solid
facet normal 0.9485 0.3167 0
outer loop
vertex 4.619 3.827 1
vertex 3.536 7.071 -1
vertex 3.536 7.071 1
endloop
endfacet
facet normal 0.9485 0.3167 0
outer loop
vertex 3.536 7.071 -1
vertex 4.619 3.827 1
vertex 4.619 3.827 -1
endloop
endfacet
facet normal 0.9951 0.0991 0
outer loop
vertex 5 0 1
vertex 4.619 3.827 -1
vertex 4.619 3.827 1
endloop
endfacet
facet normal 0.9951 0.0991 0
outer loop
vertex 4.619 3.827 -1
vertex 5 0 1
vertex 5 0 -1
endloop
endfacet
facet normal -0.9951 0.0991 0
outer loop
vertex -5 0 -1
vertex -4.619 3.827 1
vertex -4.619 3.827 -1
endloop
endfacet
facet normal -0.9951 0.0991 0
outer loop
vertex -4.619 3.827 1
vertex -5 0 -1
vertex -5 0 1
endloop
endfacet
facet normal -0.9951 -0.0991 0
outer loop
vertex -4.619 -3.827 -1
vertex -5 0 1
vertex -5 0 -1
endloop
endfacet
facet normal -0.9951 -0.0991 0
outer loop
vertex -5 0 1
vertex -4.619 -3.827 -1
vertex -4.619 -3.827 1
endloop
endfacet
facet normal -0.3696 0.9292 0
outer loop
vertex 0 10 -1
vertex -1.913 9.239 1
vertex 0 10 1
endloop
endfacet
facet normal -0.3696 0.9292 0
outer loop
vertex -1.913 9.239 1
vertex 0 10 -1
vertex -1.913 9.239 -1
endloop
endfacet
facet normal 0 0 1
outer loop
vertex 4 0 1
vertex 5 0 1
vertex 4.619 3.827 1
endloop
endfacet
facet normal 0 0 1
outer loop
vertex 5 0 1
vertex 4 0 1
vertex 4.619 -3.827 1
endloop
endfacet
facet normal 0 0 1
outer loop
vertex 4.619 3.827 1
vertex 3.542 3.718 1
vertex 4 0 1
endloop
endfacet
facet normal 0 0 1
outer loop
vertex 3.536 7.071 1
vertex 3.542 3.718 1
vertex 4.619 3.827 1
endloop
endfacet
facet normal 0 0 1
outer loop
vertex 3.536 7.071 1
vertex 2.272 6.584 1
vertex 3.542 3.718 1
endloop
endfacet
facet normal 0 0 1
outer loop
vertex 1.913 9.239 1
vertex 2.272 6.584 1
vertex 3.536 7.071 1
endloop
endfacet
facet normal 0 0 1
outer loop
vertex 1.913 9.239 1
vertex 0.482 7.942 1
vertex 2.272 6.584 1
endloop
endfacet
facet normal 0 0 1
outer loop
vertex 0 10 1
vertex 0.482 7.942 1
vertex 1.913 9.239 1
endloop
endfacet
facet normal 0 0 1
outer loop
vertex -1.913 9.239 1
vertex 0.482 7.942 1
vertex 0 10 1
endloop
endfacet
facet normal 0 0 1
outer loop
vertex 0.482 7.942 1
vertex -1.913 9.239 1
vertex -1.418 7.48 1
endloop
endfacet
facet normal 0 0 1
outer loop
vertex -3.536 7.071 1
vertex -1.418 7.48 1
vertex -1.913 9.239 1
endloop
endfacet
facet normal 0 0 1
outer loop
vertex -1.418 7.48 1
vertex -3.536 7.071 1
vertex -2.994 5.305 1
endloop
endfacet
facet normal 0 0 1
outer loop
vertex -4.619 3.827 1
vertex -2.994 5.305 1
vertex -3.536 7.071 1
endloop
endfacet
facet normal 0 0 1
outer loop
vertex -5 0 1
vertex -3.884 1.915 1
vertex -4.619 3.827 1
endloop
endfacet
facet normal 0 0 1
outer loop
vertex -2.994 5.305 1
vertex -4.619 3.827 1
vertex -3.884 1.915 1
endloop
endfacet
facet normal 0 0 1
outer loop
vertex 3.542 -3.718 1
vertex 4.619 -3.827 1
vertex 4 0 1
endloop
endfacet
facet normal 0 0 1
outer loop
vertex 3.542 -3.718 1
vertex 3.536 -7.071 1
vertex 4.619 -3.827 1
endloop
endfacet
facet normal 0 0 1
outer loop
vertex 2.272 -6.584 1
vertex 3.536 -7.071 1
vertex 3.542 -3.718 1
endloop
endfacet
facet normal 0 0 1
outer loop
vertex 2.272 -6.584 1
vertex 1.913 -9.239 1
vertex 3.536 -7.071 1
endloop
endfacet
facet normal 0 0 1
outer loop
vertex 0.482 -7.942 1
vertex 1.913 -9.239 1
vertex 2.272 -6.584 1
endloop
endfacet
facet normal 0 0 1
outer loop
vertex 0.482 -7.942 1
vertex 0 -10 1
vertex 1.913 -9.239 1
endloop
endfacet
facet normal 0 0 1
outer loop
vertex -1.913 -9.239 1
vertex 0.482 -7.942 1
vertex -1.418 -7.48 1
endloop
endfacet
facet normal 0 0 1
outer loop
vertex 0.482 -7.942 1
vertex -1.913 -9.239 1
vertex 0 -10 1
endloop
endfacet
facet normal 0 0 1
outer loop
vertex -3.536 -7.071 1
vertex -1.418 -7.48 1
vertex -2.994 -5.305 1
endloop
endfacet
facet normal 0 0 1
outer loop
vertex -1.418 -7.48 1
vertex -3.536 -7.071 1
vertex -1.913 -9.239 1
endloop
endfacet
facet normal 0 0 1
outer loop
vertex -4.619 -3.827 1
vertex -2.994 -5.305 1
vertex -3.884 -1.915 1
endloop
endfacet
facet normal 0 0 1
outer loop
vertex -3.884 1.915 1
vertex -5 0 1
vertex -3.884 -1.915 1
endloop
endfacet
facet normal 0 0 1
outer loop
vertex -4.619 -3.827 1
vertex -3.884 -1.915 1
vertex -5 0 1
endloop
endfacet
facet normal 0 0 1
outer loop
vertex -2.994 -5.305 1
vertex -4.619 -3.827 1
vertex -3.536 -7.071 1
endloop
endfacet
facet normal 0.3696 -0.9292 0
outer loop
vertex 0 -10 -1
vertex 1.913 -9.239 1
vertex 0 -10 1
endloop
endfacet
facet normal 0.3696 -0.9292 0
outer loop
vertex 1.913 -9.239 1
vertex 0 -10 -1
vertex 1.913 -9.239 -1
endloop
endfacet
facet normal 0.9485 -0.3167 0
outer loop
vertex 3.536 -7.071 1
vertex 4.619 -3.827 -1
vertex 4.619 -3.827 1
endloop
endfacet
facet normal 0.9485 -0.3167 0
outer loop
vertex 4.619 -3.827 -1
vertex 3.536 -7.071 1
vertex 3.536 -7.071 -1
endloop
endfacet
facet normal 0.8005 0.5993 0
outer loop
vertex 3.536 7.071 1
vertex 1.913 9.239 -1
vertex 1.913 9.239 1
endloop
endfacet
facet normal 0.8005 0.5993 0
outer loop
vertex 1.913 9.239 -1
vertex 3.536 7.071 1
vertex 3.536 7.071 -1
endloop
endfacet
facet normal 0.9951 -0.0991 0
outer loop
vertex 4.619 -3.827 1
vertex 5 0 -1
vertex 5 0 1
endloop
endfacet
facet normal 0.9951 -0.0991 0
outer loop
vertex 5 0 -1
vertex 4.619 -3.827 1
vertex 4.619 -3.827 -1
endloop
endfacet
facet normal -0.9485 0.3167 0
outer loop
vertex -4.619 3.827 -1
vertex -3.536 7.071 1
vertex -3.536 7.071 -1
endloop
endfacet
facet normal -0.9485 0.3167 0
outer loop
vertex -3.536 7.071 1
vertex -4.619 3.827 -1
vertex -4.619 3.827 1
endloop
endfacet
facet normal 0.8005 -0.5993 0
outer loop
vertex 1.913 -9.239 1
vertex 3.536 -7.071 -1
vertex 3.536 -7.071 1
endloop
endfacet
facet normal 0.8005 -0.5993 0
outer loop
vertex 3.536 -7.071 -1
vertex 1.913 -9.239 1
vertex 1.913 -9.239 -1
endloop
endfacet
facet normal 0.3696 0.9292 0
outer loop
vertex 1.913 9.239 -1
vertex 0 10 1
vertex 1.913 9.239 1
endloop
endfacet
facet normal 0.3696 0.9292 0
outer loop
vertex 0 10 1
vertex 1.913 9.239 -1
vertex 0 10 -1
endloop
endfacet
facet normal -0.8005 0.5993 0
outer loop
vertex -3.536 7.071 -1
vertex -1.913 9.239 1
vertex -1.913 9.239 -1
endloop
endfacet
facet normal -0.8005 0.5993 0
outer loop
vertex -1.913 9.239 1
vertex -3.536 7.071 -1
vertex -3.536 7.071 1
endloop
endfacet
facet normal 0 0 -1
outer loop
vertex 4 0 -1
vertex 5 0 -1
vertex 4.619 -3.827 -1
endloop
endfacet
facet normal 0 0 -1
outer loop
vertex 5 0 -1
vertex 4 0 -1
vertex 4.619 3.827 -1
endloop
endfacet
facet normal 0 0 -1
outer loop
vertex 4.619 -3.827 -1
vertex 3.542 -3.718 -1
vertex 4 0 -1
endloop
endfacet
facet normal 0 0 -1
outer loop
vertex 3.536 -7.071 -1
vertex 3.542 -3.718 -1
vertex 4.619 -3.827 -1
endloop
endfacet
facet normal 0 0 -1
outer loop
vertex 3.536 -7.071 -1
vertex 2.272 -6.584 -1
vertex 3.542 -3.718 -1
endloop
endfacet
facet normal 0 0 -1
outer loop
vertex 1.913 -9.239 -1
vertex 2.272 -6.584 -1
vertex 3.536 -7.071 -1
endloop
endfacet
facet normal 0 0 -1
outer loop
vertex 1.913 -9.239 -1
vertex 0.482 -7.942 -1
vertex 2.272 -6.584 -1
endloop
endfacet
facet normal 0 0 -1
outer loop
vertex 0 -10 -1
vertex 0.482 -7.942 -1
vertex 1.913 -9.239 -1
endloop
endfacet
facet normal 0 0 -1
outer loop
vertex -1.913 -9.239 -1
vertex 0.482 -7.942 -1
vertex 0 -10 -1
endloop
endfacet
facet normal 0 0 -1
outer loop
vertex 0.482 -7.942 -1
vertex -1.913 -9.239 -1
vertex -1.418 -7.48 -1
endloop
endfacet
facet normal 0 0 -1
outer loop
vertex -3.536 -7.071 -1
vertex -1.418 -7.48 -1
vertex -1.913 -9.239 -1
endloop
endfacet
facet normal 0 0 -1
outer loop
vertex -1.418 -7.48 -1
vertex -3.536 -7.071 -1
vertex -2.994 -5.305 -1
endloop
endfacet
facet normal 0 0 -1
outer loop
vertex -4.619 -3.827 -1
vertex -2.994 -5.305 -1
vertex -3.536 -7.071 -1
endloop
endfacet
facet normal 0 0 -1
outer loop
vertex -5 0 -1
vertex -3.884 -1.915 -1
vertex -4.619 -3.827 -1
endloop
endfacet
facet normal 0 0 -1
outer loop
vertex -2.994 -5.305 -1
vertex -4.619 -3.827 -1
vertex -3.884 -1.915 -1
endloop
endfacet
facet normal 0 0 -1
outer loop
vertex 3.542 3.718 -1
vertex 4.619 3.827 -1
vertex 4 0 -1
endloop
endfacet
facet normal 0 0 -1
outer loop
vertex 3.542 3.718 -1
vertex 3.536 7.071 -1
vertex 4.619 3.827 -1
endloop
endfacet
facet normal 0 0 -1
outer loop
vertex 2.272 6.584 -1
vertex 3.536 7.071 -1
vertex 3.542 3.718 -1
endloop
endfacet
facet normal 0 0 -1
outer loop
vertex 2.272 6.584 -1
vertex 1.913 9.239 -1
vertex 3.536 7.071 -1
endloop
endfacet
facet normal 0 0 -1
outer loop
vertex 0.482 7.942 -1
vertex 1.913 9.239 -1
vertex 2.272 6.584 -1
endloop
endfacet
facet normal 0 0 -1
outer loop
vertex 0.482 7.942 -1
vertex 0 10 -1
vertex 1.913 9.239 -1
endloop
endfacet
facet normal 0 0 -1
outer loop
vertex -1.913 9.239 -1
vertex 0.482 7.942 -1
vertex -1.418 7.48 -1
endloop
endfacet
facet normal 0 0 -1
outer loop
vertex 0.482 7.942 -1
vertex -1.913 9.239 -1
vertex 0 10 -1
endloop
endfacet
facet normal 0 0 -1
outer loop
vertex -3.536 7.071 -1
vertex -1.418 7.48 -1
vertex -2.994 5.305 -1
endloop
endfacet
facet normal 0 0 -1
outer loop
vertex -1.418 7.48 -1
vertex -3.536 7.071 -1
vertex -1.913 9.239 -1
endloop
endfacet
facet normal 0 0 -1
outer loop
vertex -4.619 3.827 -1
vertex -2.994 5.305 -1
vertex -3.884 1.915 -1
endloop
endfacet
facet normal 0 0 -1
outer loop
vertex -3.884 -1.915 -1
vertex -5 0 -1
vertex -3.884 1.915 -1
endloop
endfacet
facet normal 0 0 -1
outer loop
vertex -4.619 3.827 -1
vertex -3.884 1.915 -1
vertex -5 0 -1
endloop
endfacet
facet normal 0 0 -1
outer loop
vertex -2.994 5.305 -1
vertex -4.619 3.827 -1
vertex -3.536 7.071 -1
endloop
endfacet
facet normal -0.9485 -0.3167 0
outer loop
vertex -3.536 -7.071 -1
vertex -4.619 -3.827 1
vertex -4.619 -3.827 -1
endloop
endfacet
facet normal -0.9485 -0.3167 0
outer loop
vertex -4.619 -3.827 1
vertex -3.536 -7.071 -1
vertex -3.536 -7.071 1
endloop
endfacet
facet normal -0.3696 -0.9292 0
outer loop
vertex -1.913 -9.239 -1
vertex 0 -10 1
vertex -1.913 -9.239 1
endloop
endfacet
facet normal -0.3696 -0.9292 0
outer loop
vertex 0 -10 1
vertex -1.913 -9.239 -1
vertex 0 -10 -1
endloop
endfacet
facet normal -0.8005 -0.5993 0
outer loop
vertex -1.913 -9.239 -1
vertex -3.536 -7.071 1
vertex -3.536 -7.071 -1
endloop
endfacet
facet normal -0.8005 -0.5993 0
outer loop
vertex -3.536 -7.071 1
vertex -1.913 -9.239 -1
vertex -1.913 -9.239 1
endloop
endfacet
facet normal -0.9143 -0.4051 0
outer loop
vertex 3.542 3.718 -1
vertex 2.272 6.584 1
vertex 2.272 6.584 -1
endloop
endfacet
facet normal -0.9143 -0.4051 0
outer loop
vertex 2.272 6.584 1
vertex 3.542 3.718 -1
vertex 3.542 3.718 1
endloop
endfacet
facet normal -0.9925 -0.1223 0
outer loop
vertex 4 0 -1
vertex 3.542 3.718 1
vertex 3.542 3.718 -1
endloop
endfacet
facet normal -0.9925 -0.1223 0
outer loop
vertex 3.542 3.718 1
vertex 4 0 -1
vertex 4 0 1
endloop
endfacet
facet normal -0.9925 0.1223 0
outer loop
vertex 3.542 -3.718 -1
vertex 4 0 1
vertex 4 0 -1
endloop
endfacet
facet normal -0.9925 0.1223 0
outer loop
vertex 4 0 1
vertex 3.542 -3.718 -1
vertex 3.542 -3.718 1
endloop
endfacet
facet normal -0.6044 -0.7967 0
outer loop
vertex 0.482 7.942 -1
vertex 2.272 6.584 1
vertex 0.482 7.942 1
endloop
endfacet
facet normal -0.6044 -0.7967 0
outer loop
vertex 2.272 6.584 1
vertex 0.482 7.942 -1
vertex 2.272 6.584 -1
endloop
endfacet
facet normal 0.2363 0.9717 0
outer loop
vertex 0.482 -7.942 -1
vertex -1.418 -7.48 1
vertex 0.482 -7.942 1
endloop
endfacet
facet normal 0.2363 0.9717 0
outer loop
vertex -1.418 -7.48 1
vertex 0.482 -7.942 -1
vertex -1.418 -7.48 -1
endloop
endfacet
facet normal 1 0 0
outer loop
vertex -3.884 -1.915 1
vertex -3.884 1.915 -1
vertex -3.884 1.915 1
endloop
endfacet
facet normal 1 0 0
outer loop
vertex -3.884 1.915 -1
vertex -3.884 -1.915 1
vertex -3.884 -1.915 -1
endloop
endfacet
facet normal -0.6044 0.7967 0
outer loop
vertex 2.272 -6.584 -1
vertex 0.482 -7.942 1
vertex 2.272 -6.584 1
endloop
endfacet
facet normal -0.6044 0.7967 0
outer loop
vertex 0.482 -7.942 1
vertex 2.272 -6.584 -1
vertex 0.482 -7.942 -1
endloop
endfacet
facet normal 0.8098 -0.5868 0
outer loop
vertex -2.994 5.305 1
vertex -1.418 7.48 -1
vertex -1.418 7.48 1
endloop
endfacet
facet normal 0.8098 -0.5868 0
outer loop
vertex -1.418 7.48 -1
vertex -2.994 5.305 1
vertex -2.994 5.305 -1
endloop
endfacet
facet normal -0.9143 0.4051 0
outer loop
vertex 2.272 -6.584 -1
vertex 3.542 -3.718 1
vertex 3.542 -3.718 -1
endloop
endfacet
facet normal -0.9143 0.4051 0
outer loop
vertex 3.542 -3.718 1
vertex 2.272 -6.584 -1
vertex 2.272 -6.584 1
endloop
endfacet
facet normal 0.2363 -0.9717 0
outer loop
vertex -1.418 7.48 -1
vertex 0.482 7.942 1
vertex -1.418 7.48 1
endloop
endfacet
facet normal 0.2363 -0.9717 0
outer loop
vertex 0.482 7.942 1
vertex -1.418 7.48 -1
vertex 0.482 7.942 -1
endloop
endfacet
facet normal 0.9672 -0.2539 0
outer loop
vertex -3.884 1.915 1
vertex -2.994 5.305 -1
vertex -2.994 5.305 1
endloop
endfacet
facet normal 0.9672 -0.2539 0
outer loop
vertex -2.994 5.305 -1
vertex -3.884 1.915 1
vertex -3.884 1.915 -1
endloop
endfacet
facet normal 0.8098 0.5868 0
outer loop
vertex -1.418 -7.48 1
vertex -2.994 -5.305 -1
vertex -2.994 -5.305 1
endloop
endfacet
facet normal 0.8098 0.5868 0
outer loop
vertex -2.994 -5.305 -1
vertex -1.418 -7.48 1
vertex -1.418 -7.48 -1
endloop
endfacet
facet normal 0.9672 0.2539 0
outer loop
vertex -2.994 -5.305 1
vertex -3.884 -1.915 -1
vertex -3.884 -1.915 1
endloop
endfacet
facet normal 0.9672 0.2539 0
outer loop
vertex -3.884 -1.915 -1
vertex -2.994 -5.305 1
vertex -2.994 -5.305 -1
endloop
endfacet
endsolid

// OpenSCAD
difference(){scale([1,2,1])cylinder(h=2, r=5, center=true);
scale([1,2,1])cylinder(h=2.02, r=4, center=true);
}
